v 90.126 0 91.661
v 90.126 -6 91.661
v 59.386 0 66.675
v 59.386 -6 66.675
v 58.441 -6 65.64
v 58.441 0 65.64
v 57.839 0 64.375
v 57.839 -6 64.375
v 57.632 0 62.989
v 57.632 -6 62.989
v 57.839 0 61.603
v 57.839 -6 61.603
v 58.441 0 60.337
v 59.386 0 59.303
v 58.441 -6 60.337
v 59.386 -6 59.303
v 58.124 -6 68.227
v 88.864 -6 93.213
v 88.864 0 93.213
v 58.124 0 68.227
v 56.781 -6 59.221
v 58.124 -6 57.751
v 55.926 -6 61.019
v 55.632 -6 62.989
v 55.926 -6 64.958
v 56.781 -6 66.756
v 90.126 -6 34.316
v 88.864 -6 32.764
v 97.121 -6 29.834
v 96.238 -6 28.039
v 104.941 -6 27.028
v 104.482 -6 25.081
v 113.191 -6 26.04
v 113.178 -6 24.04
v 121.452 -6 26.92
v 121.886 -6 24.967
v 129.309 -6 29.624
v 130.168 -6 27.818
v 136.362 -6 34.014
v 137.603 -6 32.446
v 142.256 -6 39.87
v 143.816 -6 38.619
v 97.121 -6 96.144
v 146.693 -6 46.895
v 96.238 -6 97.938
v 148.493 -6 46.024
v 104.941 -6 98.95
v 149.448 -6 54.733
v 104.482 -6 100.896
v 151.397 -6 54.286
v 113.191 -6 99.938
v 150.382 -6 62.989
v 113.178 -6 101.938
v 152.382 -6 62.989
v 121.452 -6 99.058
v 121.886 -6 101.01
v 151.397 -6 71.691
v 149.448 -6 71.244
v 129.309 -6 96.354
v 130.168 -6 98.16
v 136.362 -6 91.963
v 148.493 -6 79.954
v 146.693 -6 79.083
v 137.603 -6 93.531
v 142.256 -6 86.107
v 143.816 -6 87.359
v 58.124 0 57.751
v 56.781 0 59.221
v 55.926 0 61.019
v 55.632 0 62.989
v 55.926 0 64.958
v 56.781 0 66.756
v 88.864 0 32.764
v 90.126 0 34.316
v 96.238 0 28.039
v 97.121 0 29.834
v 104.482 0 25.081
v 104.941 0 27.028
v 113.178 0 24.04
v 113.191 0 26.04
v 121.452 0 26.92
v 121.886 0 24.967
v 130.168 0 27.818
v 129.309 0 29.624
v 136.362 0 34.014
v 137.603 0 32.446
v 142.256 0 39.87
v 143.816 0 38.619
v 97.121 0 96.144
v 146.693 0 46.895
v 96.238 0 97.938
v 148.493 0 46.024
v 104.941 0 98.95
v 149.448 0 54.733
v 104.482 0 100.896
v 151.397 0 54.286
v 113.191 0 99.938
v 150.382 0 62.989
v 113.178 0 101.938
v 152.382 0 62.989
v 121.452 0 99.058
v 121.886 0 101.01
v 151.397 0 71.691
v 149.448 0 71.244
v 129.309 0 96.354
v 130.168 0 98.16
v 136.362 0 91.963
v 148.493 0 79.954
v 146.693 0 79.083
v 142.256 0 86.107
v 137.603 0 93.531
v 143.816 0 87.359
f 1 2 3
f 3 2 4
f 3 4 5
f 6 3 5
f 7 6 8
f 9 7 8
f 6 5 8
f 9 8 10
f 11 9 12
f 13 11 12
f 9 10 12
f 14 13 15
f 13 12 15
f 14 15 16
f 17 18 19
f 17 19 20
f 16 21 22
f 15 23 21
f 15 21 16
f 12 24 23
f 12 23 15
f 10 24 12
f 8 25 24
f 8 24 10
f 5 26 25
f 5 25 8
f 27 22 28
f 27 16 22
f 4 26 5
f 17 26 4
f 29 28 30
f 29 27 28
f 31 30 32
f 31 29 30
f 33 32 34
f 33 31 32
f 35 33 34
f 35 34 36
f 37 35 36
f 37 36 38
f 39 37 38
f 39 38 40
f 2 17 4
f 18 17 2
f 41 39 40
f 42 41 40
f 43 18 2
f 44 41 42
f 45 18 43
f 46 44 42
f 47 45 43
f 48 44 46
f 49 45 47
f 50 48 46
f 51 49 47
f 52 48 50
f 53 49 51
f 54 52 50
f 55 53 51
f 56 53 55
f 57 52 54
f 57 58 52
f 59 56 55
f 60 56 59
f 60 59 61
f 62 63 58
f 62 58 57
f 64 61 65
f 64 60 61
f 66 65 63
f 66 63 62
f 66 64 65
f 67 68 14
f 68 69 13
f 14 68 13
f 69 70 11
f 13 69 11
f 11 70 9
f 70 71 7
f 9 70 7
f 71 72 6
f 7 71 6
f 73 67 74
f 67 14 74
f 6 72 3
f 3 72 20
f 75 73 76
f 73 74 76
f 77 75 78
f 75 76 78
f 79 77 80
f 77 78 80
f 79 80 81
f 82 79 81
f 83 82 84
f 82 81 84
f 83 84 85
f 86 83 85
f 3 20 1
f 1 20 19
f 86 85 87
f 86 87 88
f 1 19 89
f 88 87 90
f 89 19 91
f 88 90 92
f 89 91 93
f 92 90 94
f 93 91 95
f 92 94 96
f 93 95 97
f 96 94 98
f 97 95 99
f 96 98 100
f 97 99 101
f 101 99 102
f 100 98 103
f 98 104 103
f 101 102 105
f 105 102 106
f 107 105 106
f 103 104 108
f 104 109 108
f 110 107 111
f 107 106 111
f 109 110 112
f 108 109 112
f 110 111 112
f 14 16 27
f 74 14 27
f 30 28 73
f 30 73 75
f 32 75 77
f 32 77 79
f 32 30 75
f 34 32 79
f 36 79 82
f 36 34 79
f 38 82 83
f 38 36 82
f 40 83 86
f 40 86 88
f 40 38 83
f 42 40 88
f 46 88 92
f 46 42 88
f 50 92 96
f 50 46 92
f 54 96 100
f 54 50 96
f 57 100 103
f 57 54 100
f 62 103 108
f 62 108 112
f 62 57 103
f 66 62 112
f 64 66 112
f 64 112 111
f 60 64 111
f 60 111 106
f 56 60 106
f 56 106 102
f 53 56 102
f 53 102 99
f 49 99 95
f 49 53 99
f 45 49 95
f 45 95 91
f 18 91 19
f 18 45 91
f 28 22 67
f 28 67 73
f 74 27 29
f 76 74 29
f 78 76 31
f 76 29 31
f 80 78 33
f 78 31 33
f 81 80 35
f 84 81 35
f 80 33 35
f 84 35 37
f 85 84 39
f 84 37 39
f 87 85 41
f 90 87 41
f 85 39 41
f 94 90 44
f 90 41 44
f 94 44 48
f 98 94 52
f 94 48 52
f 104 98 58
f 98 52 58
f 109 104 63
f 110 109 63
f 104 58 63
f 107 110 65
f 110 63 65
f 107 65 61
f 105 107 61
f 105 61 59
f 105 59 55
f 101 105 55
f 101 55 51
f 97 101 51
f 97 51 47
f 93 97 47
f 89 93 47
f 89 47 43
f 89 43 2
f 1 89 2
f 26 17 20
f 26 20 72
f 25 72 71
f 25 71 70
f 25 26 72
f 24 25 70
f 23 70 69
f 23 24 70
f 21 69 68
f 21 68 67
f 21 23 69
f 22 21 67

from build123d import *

# Parameters (mm, degrees)
F1_DEPTH = 6
F3_DEPTH = 25
F5_DEPTH = 6


with BuildPart() as f1:
    # F0 (on Front) → F1 (new body)
    with BuildSketch(Plane.XZ):
        with BuildLine():
            Line((58.7550879584, 58.5268499794), (89.4948039231, 33.5402062991))
            ThreePointArc((89.4948039231, 33.5402062991), (151.3819243933, 62.9887506366), (89.4948039231, 92.4372949741))
            Line((89.4948039231, 92.4372949741), (58.7550879584, 67.4506512938))
            ThreePointArc((58.7550879584, 67.4506512938), (56.6319243933, 62.9887506366), (58.7550879584, 58.5268499794))
        make_face()
    extrude(amount=F1_DEPTH)

    # F2 (on face) → F3 (cut)
    with BuildSketch(Plane.XZ.offset(6)):
        with BuildLine():
            Line((90.1255580857, 91.6613122511), (59.385842121, 66.6746685708))
            ThreePointArc((59.385842121, 66.6746685708), (57.6319243933, 62.9887506366), (59.385842121, 59.3028327024))
            Line((59.385842121, 59.3028327024), (90.1255580857, 34.3161890221))
            ThreePointArc((90.1255580857, 34.3161890221), (150.3819243933, 62.9887506366), (90.1255580857, 91.6613122511))
        make_face()
    extrude(amount=-F3_DEPTH, mode=Mode.SUBTRACT)

    # F4 (on face) → F5 (join)
    with BuildSketch(Plane.XZ.offset(6)):
        with BuildLine():
            Line((88.8640497606, 93.2132776971), (58.1243337958, 68.2266340168))
            ThreePointArc((58.1243337958, 68.2266340168), (55.6319243933, 62.9887506366), (58.1243337958, 57.7508672564))
            Line((58.1243337958, 57.7508672564), (88.8640497606, 32.7642235761))
            ThreePointArc((88.8640497606, 32.7642235761), (152.3819243933, 62.9887506366), (88.8640497606, 93.2132776971))
        make_face()
        with BuildLine():
            Line((58.7550879584, 67.4506512938), (89.4948039231, 92.4372949741))
            ThreePointArc((89.4948039231, 92.4372949741), (151.3819243933, 62.9887506366), (89.4948039231, 33.5402062991))
            Line((89.4948039231, 33.5402062991), (58.7550879584, 58.5268499794))
            ThreePointArc((58.7550879584, 58.5268499794), (56.6319243933, 62.9887506366), (58.7550879584, 67.4506512938))
        make_face(mode=Mode.SUBTRACT)
    extrude(amount=-F5_DEPTH)


solid = f1.part
